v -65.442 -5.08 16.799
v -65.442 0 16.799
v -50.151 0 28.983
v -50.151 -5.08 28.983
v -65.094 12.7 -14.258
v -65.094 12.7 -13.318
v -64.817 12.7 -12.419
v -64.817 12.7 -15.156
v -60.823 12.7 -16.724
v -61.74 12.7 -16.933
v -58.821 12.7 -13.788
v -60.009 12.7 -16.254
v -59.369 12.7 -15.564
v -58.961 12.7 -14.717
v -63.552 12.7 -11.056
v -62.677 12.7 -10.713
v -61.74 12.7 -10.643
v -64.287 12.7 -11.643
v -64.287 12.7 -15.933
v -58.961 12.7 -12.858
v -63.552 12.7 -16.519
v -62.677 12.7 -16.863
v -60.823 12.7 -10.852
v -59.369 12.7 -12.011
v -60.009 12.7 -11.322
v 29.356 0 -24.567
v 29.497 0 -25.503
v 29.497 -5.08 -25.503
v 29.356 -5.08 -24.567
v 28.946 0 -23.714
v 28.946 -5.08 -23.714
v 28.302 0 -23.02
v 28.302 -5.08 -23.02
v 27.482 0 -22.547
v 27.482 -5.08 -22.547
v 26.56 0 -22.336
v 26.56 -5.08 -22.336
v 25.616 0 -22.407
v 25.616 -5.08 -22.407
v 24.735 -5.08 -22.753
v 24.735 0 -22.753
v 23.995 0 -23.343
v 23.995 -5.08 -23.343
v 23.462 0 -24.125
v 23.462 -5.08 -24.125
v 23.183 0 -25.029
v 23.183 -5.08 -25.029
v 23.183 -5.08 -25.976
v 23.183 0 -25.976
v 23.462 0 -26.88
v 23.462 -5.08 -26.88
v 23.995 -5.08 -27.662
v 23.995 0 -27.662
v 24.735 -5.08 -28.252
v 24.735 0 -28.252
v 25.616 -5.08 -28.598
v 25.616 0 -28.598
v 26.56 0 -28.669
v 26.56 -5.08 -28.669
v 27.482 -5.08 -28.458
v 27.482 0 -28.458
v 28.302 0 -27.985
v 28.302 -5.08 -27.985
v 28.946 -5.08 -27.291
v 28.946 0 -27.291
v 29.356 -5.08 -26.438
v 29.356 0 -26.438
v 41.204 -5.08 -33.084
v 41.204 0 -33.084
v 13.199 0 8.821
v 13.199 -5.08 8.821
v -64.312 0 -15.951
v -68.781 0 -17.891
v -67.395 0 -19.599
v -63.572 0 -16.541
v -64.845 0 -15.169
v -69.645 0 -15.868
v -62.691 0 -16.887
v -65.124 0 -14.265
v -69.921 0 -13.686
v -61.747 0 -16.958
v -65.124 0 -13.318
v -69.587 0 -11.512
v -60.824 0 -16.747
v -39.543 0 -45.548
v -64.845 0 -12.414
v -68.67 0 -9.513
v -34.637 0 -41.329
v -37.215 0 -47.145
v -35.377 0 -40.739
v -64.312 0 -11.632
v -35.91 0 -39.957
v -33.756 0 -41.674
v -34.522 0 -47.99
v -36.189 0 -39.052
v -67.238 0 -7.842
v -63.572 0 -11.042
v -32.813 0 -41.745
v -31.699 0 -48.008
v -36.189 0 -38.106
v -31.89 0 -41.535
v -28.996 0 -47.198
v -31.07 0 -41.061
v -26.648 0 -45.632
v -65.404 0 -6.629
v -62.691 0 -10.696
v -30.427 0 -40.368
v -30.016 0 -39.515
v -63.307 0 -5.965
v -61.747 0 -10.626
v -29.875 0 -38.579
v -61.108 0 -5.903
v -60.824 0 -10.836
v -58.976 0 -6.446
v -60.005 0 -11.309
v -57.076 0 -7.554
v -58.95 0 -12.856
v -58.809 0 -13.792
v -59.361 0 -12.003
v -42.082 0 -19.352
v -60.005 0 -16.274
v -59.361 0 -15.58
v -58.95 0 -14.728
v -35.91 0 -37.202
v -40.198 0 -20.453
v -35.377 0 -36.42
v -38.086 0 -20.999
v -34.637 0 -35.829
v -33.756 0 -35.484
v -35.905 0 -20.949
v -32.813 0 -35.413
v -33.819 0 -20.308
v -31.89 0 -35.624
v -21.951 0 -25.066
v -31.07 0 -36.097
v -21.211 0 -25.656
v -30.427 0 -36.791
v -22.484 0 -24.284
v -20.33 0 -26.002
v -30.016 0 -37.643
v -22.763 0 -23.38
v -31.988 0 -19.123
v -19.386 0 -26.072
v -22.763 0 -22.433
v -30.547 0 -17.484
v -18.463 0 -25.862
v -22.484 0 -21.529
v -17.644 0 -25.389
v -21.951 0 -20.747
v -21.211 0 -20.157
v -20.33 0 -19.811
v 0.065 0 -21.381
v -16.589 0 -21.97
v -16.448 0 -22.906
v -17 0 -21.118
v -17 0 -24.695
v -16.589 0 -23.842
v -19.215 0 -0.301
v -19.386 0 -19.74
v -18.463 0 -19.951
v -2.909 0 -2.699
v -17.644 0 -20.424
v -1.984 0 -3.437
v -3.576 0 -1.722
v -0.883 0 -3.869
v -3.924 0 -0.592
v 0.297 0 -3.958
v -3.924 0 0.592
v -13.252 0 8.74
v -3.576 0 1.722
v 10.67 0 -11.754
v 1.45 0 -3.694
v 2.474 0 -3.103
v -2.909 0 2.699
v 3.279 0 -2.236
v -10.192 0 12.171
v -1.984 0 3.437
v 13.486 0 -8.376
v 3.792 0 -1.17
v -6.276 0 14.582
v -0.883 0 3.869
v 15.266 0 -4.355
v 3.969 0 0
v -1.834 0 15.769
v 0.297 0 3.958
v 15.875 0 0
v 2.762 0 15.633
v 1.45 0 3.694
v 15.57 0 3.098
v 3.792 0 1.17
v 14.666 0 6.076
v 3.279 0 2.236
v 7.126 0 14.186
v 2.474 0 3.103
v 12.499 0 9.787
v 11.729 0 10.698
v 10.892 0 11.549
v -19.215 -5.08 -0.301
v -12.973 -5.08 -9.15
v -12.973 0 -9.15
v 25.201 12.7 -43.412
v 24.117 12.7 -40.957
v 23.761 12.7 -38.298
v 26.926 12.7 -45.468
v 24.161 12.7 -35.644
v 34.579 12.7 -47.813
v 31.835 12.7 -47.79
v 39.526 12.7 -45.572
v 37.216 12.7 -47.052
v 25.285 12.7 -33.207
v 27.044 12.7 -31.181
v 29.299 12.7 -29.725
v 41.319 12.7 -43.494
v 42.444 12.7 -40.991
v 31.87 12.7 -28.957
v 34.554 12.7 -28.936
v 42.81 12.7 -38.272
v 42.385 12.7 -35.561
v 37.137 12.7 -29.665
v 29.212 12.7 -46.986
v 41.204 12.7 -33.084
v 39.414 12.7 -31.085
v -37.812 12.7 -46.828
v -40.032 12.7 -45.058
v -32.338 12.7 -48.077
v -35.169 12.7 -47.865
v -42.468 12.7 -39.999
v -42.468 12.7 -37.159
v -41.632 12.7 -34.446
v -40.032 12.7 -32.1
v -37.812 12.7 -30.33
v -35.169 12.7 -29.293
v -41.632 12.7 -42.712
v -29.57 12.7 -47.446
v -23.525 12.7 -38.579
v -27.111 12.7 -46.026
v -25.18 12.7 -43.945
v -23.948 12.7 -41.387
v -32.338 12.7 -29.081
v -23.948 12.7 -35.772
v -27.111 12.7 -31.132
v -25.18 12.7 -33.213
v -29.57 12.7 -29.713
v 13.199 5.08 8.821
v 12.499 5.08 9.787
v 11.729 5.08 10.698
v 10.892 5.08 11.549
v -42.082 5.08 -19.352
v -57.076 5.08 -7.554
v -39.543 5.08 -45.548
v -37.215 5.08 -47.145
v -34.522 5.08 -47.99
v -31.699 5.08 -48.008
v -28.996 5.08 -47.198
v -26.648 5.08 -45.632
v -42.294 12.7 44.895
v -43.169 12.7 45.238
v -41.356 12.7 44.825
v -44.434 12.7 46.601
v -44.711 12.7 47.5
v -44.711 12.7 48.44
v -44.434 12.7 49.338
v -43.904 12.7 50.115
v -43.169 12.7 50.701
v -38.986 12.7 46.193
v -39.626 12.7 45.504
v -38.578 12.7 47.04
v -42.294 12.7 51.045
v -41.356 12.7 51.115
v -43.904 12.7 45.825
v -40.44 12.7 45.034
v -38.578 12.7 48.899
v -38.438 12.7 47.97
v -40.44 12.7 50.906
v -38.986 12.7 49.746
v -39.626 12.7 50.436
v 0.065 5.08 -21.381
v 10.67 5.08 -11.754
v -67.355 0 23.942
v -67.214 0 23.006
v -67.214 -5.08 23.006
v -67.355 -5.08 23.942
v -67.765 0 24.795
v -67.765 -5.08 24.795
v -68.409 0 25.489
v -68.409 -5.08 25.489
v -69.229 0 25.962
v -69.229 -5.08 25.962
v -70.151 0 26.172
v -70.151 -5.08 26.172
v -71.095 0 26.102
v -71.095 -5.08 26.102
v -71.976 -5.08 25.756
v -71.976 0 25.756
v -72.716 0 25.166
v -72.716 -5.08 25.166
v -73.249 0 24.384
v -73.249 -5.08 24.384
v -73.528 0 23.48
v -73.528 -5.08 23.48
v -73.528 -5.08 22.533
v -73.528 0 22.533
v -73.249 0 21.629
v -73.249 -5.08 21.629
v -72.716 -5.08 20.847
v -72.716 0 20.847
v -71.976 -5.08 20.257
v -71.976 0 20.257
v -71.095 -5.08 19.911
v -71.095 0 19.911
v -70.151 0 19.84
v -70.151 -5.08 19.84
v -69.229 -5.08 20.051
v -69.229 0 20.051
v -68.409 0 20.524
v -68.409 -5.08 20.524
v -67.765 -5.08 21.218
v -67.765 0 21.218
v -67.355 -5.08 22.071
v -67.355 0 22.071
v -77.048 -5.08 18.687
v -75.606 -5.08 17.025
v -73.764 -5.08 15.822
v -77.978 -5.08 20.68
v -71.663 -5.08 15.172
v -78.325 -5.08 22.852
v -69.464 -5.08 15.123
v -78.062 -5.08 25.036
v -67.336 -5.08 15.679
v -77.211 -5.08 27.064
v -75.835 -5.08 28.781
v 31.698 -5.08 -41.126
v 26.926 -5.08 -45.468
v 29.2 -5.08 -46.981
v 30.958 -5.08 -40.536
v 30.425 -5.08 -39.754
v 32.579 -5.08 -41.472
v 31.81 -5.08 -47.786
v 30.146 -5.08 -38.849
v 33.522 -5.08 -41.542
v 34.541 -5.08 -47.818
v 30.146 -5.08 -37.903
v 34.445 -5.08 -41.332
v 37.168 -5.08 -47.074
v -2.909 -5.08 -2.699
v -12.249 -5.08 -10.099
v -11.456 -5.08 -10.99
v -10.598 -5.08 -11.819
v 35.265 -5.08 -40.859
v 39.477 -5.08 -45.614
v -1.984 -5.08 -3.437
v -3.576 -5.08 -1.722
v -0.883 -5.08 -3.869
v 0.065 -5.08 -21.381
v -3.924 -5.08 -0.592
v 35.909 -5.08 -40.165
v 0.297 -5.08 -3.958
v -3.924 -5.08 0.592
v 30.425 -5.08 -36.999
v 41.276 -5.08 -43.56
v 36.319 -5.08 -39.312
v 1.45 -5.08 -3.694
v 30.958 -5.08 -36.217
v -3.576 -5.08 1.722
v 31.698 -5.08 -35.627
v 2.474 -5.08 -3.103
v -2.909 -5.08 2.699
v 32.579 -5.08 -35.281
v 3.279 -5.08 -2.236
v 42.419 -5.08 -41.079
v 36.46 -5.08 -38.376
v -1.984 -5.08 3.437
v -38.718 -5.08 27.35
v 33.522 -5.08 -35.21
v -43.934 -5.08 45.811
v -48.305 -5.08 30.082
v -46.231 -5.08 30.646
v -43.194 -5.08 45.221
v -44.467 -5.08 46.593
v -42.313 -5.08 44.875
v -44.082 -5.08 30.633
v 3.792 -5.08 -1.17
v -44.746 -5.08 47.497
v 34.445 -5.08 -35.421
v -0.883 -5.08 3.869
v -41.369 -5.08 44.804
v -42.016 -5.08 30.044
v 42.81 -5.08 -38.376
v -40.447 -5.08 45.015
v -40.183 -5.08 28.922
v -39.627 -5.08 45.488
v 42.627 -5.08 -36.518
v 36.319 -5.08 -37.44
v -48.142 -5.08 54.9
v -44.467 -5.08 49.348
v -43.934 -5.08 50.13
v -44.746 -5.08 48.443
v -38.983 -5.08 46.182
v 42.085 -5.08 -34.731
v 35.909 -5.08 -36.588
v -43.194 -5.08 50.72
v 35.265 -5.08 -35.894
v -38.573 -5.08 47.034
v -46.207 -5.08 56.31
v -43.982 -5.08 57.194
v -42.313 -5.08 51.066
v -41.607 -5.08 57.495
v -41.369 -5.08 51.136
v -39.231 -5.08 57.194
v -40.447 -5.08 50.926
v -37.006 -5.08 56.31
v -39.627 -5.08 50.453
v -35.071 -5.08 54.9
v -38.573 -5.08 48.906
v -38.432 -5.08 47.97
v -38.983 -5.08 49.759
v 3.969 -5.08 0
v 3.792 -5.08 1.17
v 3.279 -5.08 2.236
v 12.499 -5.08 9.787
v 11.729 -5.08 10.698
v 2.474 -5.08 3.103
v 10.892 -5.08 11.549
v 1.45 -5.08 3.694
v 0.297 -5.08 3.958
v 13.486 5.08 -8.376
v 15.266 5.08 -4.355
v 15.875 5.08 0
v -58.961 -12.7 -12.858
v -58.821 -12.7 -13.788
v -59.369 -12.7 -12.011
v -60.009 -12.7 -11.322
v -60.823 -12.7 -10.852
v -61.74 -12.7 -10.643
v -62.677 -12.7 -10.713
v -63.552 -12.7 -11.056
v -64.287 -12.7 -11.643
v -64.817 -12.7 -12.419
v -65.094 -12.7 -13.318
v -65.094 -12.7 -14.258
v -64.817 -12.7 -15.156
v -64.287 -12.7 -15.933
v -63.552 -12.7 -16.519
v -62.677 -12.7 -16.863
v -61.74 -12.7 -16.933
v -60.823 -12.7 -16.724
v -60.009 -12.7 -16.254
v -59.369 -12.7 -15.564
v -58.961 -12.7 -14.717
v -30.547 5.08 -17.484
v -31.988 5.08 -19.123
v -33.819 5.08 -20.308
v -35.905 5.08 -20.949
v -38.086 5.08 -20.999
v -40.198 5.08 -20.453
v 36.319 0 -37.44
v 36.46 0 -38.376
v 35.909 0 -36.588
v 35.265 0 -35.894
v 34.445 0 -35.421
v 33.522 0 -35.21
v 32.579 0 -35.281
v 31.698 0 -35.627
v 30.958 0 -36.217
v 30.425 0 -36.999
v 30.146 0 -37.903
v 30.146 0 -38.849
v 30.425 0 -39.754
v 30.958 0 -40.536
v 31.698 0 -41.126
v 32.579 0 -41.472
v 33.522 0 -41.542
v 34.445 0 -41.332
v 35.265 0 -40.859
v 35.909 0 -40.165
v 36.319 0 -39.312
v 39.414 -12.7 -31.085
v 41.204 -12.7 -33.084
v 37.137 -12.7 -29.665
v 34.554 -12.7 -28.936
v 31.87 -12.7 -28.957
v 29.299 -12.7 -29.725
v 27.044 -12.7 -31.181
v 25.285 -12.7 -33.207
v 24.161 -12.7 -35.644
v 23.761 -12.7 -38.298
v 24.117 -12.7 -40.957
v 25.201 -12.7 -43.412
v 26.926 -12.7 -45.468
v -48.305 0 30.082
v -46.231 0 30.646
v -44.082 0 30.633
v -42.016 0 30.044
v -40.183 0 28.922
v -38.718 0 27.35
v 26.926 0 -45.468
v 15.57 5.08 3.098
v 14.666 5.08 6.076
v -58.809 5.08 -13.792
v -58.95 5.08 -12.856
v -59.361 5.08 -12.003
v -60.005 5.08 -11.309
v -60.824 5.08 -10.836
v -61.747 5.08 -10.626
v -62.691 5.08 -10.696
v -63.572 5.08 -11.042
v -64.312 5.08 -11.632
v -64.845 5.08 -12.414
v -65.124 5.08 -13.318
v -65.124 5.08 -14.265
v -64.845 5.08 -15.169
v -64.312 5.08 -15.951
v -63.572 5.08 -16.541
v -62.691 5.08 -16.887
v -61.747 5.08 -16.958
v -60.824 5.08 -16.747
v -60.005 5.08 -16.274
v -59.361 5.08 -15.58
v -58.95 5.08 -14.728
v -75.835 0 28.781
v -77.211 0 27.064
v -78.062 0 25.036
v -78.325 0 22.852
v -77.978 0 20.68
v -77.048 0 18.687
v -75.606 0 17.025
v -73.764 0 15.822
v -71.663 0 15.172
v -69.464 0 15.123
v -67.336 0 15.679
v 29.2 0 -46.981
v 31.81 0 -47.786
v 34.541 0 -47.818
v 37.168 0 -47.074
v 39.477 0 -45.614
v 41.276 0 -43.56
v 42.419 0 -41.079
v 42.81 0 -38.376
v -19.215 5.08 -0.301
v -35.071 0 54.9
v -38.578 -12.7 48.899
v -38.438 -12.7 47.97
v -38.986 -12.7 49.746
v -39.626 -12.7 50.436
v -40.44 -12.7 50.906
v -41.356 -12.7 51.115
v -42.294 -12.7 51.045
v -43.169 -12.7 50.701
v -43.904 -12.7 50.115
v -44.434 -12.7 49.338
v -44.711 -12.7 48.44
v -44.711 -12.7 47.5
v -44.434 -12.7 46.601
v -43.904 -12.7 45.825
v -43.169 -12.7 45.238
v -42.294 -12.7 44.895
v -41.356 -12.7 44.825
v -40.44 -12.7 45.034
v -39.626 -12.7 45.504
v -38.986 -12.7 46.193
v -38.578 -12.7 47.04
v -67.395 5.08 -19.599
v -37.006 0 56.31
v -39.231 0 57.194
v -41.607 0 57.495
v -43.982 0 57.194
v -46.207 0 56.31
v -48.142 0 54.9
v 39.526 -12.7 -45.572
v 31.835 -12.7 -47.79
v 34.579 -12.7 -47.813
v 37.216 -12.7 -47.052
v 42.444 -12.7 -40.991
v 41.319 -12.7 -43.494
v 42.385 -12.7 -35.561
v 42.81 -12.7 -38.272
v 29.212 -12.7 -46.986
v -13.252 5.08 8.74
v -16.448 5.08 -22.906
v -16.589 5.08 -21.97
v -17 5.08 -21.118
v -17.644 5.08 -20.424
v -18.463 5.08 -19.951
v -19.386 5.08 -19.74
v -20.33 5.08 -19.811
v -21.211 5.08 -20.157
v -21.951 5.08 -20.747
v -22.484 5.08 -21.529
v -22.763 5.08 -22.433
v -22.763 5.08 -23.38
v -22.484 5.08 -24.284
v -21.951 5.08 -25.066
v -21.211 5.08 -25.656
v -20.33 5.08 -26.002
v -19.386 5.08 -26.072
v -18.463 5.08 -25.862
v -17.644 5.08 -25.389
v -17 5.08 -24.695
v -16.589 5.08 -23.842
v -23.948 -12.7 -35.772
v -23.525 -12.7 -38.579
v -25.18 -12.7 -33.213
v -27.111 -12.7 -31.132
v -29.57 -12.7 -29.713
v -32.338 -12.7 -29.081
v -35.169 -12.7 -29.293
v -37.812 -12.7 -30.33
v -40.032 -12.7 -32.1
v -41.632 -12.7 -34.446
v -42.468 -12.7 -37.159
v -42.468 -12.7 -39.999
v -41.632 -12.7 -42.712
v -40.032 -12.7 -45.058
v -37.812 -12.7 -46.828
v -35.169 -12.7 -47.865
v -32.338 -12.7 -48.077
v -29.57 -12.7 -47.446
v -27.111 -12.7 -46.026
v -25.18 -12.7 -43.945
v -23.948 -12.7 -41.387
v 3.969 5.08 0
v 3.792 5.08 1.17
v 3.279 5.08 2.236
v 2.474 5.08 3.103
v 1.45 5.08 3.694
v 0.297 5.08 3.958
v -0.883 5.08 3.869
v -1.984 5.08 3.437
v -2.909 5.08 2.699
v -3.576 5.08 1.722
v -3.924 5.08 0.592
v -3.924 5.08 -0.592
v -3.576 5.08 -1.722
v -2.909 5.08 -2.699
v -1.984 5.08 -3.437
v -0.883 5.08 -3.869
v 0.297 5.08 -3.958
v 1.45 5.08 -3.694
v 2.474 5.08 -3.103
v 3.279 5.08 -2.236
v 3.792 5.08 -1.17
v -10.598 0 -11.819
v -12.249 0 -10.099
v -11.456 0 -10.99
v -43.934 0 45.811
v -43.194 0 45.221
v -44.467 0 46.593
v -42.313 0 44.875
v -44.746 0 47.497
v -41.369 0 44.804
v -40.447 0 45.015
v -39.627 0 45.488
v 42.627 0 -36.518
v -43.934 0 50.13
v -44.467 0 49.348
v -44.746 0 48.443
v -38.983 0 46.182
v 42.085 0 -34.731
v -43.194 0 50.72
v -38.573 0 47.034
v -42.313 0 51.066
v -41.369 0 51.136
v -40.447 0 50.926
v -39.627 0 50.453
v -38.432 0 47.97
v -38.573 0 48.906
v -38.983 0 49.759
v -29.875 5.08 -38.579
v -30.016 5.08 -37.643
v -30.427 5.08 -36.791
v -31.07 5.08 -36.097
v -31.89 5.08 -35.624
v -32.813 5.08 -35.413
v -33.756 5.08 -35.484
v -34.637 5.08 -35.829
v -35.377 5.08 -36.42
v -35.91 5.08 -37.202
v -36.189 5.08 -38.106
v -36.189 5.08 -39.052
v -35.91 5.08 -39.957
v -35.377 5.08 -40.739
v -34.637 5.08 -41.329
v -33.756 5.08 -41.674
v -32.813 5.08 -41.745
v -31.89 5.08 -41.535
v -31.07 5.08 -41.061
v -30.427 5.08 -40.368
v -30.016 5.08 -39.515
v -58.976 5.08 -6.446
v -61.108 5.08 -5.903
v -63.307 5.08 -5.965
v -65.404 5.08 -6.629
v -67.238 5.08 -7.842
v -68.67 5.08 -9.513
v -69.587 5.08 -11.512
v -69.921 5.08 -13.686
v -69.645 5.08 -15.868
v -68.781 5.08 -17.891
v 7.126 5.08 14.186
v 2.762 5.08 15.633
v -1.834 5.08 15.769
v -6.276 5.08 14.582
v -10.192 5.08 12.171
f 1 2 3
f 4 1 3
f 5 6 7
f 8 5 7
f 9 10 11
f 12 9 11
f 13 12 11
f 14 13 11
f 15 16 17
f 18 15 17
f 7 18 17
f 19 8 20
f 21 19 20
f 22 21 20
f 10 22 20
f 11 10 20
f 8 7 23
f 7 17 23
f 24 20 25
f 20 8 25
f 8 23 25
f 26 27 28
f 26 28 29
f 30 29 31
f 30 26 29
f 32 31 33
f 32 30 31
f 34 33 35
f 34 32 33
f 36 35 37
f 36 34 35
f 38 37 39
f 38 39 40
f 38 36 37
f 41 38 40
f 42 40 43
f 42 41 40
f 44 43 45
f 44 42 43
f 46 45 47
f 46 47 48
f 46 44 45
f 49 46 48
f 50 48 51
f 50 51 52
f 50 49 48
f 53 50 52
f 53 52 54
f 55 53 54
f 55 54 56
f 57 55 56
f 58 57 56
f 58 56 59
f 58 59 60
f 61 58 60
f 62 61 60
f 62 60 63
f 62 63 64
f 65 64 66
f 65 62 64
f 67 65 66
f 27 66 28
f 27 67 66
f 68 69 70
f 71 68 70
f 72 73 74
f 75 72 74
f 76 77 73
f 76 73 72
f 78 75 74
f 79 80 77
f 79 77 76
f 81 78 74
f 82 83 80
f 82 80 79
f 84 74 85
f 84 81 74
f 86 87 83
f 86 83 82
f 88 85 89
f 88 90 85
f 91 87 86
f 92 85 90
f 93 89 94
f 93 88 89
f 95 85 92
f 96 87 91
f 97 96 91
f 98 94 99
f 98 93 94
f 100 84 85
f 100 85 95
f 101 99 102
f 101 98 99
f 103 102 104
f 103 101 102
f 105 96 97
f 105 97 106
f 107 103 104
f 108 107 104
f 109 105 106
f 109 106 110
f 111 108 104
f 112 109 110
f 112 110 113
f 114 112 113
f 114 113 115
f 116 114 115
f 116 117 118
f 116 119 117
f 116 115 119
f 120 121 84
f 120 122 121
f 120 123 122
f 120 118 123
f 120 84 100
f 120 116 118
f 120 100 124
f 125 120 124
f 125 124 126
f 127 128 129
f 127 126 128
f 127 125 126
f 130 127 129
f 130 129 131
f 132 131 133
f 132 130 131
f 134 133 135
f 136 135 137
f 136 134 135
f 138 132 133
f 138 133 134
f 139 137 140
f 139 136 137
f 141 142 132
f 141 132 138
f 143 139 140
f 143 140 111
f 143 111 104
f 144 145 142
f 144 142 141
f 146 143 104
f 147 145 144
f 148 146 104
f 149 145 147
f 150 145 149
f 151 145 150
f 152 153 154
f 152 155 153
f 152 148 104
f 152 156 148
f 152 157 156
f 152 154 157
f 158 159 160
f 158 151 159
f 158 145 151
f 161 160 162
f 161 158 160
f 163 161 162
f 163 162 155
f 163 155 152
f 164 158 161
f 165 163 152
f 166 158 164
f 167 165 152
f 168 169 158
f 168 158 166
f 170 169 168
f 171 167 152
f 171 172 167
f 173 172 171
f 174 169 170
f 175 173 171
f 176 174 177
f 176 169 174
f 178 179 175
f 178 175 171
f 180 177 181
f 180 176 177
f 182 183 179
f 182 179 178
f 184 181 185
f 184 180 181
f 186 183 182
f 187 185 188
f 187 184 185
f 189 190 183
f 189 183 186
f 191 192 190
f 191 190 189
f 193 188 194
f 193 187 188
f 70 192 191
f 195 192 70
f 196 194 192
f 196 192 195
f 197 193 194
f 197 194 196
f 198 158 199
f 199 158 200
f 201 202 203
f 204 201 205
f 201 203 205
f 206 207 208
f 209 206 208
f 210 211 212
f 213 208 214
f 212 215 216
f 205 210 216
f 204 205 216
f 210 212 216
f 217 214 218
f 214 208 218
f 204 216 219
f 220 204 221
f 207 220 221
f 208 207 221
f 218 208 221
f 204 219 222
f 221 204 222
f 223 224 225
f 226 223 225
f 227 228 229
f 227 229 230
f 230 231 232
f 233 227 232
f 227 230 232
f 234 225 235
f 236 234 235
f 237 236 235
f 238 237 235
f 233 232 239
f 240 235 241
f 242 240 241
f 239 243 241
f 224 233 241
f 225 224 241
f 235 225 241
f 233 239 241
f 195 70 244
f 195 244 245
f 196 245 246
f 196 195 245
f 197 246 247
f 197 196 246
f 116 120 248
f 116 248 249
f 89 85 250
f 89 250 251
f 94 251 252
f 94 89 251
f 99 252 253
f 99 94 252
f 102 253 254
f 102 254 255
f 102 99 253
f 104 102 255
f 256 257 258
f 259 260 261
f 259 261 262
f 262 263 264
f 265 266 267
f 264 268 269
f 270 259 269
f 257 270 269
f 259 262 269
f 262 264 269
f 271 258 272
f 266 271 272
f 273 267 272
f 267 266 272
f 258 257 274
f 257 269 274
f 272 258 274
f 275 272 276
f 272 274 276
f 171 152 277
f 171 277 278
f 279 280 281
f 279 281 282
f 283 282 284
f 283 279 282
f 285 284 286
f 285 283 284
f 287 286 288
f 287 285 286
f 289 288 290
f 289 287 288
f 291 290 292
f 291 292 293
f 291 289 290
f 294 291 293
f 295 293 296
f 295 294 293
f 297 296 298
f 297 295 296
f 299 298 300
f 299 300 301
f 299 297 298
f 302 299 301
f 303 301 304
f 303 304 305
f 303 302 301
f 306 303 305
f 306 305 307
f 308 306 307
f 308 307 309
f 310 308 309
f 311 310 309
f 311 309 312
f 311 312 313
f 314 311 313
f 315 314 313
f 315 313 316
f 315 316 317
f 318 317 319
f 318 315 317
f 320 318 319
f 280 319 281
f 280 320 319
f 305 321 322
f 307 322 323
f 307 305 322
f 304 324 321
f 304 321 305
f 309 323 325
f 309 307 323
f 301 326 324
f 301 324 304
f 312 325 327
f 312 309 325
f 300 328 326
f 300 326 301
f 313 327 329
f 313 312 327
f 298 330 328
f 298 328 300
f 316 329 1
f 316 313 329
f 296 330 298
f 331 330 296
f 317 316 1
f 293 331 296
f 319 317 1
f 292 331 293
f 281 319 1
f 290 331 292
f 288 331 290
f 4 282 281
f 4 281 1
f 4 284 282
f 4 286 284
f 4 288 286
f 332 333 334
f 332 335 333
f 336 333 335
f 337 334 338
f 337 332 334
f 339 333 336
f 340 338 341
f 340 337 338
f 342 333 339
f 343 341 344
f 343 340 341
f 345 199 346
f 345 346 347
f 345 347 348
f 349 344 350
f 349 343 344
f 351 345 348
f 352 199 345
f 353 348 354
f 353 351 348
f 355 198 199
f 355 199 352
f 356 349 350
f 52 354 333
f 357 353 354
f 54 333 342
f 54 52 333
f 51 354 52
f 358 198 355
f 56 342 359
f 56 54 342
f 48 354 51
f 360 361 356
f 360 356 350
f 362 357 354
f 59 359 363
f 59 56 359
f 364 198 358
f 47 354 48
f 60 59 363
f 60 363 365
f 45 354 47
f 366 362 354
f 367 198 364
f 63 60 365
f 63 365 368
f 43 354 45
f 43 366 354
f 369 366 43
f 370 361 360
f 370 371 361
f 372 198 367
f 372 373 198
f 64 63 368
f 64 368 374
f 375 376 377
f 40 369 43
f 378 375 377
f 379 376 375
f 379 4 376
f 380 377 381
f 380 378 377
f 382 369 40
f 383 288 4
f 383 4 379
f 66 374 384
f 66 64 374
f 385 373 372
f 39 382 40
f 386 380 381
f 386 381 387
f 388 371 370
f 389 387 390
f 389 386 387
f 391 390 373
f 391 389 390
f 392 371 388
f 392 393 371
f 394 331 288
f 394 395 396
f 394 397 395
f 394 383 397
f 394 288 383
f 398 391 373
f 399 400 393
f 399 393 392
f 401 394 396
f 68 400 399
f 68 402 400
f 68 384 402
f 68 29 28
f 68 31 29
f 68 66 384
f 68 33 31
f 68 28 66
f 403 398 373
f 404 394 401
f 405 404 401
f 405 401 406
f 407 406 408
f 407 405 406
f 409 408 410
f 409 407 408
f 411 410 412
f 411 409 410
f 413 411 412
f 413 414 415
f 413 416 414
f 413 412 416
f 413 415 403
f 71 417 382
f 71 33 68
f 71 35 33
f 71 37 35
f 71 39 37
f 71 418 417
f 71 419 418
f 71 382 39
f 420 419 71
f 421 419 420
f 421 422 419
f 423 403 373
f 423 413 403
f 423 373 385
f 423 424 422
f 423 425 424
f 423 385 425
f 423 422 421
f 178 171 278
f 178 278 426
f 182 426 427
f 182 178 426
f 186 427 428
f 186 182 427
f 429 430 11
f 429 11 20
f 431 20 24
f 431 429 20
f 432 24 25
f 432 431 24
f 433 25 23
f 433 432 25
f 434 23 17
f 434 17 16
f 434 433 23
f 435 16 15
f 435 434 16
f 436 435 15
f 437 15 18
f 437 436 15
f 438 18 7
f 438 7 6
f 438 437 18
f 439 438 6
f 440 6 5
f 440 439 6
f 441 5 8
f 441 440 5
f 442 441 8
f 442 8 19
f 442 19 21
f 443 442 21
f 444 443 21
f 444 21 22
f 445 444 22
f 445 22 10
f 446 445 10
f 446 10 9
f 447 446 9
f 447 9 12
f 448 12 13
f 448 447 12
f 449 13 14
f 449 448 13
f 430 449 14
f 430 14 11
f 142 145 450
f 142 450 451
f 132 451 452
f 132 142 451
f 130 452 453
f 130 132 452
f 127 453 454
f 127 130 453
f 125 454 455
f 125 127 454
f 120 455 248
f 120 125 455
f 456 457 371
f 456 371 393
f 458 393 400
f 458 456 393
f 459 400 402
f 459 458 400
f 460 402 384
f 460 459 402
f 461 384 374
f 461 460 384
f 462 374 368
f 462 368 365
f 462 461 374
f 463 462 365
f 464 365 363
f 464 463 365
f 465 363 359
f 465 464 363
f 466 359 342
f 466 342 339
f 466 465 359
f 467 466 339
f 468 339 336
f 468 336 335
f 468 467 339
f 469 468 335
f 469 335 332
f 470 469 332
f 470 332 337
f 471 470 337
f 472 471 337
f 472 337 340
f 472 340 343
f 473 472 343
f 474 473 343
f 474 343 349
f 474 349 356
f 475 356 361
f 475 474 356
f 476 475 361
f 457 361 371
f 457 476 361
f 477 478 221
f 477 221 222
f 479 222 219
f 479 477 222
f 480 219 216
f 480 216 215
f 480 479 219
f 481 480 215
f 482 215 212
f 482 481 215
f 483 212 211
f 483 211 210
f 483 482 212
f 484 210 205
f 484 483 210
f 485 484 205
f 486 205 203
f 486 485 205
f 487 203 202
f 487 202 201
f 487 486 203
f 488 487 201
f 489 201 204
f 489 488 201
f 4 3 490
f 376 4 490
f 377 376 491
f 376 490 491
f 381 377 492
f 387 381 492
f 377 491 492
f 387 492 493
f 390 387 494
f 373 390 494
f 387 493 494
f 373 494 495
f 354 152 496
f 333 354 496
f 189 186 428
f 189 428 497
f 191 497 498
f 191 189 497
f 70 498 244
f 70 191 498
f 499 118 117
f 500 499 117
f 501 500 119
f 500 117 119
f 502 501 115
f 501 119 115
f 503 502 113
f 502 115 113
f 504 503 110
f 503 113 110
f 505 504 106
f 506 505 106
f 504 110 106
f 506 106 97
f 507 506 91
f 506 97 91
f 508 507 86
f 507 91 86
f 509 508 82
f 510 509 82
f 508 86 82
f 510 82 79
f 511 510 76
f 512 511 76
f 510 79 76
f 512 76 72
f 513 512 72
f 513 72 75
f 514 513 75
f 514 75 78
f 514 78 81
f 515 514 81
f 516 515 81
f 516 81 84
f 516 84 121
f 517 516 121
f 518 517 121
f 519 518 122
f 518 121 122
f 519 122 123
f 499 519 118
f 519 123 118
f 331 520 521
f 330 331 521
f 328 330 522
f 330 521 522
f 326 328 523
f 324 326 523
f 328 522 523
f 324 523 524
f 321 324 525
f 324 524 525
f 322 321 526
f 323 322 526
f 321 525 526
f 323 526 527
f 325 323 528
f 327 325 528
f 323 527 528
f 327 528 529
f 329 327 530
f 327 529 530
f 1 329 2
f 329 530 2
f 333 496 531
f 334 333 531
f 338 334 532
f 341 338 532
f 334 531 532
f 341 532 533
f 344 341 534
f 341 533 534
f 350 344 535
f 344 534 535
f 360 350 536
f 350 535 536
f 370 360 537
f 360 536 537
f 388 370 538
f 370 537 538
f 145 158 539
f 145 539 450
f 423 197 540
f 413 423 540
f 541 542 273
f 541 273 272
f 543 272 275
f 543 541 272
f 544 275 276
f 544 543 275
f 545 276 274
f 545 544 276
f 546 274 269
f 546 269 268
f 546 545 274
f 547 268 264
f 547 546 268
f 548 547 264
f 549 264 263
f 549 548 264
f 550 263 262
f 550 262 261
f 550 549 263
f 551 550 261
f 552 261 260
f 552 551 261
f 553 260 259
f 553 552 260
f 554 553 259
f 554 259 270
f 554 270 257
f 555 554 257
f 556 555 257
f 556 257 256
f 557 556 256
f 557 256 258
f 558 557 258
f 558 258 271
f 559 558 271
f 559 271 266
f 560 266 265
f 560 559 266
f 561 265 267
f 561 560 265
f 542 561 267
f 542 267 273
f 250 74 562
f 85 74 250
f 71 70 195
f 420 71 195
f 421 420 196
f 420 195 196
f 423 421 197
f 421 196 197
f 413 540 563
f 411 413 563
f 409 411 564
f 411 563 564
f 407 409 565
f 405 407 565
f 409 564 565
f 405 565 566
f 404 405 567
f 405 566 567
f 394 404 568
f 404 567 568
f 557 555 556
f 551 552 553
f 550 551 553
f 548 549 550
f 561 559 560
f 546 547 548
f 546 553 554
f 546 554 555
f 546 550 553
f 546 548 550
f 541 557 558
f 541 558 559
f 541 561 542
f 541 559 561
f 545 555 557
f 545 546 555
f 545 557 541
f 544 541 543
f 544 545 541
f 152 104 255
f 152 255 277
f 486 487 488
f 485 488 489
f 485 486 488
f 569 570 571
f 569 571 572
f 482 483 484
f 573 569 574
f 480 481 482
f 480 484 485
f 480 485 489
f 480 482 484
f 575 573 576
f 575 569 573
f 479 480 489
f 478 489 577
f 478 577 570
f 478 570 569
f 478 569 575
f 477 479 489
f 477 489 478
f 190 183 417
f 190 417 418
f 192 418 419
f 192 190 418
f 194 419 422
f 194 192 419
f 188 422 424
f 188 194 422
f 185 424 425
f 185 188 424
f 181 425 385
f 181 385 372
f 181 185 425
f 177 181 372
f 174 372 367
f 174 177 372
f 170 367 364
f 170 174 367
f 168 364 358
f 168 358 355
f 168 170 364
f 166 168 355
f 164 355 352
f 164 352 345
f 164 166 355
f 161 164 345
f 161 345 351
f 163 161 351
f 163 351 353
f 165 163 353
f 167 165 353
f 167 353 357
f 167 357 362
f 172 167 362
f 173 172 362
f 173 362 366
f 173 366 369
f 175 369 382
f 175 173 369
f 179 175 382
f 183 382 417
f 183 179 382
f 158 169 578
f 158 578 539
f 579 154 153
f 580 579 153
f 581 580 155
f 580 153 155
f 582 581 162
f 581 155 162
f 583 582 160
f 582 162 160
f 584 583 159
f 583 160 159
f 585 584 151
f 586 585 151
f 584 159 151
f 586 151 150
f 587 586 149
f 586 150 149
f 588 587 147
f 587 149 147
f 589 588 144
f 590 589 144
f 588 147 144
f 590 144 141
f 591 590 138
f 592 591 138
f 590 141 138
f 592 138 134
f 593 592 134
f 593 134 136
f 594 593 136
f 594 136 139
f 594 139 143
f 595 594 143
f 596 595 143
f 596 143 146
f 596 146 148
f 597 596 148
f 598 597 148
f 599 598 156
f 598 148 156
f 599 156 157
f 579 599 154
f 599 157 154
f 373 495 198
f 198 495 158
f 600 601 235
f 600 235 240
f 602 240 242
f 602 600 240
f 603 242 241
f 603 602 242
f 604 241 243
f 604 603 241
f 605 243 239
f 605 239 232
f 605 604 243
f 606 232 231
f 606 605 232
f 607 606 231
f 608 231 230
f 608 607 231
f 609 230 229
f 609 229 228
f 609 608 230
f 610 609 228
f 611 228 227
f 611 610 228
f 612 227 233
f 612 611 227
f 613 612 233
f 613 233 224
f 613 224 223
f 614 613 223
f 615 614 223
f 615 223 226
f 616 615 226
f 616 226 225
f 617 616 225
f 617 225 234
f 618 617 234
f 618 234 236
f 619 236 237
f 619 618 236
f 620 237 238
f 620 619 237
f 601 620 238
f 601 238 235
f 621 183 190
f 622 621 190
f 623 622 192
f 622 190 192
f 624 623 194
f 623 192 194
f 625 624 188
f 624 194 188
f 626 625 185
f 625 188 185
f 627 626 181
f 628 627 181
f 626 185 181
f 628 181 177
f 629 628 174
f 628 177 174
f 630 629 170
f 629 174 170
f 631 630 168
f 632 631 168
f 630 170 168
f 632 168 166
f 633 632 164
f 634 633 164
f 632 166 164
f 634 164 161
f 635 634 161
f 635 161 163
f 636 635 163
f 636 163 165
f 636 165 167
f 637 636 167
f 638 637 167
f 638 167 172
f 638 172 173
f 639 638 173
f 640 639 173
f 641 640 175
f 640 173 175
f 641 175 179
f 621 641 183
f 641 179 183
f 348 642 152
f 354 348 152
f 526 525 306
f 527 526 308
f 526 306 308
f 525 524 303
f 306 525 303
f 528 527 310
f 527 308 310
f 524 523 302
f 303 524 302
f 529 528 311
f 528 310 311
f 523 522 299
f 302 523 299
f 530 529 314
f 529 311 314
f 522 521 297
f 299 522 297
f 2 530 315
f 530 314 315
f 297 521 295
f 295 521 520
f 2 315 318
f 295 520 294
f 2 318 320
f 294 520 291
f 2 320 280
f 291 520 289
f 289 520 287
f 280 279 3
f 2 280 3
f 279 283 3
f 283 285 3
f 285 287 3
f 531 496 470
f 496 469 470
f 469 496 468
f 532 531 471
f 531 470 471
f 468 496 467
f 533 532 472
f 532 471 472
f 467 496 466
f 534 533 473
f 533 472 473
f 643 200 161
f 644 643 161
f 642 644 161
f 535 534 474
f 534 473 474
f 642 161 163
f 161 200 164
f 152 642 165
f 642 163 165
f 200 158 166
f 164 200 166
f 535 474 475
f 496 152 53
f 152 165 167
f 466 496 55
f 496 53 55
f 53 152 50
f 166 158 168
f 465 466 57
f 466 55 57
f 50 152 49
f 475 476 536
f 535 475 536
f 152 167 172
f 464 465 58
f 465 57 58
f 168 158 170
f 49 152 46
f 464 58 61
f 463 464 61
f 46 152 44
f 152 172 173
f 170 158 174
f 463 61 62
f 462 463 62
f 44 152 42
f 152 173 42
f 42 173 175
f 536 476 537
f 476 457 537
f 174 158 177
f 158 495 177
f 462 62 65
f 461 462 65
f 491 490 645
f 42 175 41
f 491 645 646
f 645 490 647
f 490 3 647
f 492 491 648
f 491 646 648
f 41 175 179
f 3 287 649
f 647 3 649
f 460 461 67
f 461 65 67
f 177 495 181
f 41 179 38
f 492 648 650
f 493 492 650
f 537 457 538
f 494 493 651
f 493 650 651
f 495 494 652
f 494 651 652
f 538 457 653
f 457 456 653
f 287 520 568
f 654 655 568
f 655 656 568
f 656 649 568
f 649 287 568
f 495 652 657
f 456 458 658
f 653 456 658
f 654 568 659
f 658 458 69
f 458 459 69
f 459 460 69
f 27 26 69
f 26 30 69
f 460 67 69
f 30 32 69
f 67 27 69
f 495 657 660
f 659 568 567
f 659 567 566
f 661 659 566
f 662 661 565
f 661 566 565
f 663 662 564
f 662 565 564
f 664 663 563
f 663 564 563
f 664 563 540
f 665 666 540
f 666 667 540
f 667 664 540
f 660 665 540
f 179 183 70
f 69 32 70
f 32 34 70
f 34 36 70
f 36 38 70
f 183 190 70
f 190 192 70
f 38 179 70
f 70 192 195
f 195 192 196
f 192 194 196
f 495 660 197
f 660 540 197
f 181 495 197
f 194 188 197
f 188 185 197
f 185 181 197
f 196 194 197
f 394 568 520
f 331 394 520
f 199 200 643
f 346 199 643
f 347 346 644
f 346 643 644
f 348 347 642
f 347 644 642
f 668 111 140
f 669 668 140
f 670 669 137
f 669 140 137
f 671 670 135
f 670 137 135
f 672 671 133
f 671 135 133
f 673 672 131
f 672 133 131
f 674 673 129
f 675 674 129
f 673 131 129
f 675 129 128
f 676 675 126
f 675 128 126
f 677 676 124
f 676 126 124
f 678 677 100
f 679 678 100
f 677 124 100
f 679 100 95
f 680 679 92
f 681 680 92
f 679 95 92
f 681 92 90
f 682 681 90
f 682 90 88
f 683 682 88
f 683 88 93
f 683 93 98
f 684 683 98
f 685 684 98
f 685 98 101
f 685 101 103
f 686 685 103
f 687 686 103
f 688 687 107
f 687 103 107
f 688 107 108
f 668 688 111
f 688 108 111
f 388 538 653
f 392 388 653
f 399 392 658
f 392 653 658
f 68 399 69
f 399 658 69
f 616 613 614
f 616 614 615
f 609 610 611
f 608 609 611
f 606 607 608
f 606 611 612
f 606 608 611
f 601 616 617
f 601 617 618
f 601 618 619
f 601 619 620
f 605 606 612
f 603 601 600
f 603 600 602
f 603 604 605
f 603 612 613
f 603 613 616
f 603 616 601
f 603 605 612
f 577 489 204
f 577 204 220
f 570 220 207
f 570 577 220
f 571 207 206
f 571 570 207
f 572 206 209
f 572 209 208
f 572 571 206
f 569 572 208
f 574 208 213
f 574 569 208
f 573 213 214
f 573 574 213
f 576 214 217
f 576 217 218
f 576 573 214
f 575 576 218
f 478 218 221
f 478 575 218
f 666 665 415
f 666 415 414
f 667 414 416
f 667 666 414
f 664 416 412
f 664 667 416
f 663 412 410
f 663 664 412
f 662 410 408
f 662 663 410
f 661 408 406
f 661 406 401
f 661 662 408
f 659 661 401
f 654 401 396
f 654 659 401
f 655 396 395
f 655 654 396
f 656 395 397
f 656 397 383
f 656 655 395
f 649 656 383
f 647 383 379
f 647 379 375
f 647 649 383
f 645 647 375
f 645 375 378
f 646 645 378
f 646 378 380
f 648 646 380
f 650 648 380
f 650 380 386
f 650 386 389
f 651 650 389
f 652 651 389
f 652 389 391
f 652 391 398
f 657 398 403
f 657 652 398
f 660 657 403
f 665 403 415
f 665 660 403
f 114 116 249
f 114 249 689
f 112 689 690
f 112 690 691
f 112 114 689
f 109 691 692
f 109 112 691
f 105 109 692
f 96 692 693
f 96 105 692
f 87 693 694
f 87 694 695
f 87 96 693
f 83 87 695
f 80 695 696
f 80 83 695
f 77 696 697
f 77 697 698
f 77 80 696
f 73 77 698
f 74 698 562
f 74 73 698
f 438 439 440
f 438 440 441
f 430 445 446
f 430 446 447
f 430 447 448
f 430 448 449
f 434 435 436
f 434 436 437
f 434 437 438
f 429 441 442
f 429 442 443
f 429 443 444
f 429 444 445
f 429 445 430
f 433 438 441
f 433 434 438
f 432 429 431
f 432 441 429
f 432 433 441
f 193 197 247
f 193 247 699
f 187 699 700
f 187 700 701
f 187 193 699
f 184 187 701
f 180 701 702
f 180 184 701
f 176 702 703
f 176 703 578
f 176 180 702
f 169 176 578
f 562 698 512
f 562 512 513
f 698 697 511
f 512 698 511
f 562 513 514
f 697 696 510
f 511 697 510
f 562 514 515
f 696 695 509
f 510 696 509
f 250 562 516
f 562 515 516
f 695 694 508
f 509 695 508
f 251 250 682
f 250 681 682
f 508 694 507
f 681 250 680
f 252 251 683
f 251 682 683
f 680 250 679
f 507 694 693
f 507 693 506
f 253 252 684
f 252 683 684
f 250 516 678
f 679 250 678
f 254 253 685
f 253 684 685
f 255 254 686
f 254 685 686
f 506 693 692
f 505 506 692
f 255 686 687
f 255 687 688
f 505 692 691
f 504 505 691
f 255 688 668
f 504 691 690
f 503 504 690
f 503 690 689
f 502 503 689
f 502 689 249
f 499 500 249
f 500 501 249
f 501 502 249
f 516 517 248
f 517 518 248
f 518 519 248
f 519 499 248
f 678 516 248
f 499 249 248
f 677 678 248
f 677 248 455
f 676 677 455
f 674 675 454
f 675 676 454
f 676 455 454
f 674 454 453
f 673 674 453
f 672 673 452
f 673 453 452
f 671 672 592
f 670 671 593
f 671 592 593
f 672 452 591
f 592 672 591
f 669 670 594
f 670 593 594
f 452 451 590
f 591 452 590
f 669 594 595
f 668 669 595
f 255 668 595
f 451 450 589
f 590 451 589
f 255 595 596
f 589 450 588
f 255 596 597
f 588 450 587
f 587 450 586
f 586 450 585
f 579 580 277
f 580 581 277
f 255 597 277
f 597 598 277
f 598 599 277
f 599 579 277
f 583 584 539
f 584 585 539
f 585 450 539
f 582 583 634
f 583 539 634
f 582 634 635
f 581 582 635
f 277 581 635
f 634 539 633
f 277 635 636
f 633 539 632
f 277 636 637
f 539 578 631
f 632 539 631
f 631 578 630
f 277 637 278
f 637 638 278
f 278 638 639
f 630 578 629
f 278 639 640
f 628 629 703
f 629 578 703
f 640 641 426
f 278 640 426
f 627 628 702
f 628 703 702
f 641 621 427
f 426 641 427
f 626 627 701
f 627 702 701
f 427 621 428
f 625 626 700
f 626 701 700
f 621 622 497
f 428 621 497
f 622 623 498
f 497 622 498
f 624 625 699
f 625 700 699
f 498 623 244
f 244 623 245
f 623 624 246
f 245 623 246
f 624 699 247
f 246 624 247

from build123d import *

# Parameters (mm, degrees)
F0_R     = 3.175
F0_R_2   = 3.96875
F2_DEPTH = 5.08
F3_DEPTH = 5.08
F6_DEPTH = 25.4
F4_R     = 3.1539027902
F5_R     = 9.525
F5_R_2   = 3.1539027902


with BuildPart() as f2:
    # F0 (on Front) → F2 (new body)
    with BuildSketch(Plane.XZ):
        with BuildLine():
            ThreePointArc((-13.2524193062, 8.7400805221), (-1.834314477, 15.7686687897), (10.8922900307, 11.5487507067))
            Line((10.8922900307, 11.5487507067), (-35.0711574392, 54.8995176744))
            ThreePointArc((-35.0711574392, 54.8995176744), (-32.8608164346, 51.7436071154), (-32.0815314576, 47.9702672503))
            ThreePointArc((-32.0815314576, 47.9702672503), (-45.3798713227, 39.2245522274), (-48.1419054761, 54.8995176744))
            Line((-48.1419054761, 54.8995176744), (-75.8348368232, 28.7807237291))
            ThreePointArc((-75.8348368232, 28.7807237291), (-67.2442419203, 30.2944442282), (-62.4511918078, 23.0063483758))
            ThreePointArc((-62.4511918078, 23.0063483758), (-63.237943921, 19.5609585706), (-65.4422370763, 16.798571653))
            Line((-65.4422370763, 16.798571653), (-50.1509863937, 28.9828821829))
            ThreePointArc((-50.1509863937, 28.9828821829), (-44.0823996147, 30.6328866939), (-38.7182233604, 27.3502241323))
            Line((-38.7182233604, 27.3502241323), (-19.2147683858, -0.3005169703))
            Line((-19.2147683858, -0.3005169703), (-13.2524193062, 8.7400805221))
        make_face()
        with BuildLine():
            ThreePointArc((-32.0815314576, 47.9702672503), (-32.8608164346, 51.7436071154), (-35.0711574392, 54.8995176744))
            ThreePointArc((-35.0711574392, 54.8995176744), (-41.6065314576, 57.4952672503), (-48.1419054761, 54.8995176744))
            ThreePointArc((-48.1419054761, 54.8995176744), (-45.3798713227, 39.2245522274), (-32.0815314576, 47.9702672503))
        make_face()
        with Locations((-41.6065314576, 47.9702672503)):
            Circle(F0_R, mode=Mode.SUBTRACT)
        with BuildLine():
            ThreePointArc((-62.4511918078, 23.0063483758), (-67.2442419203, 30.2944442282), (-75.8348368232, 28.7807237291))
            ThreePointArc((-75.8348368232, 28.7807237291), (-76.3849752141, 17.8055319436), (-65.4422370763, 16.798571653))
            ThreePointArc((-65.4422370763, 16.798571653), (-63.237943921, 19.5609585706), (-62.4511918078, 23.0063483758))
        make_face()
        with Locations((-70.3886918078, 23.0063483758)):
            Circle(F0_R, mode=Mode.SUBTRACT)
        with BuildLine():
            ThreePointArc((15.875, 0), (15.1912005478, 4.609018433), (13.1987101208, 8.820979319))
            ThreePointArc((13.1987101208, 8.820979319), (12.1224690662, 10.2499448164), (10.8922900307, 11.5487507067))
            ThreePointArc((10.8922900307, 11.5487507067), (-1.834314477, 15.7686687897), (-13.2524193062, 8.7400805221))
            ThreePointArc((-13.2524193062, 8.7400805221), (-15.8730587934, -0.2482529814), (-12.9726166036, -9.1502373442))
            ThreePointArc((-12.9726166036, -9.1502373442), (-11.8607666217, -10.5516747555), (-10.5983019047, -11.8191210221))
            ThreePointArc((-10.5983019047, -11.8191210221), (0.0485522706, -15.8749257534), (10.6703987497, -11.7540722953))
            ThreePointArc((10.6703987497, -11.7540722953), (14.5156502636, -6.4274040191), (15.875, 0))
        make_face()
        Circle(F0_R_2, mode=Mode.SUBTRACT)
        with BuildLine():
            Line((-10.5983019047, -11.8191210221), (0.0653932355, -21.3813431455))
            Line((0.0653932355, -21.3813431455), (10.6703987497, -11.7540722953))
            ThreePointArc((10.6703987497, -11.7540722953), (0.0485522706, -15.8749257534), (-10.5983019047, -11.8191210221))
        make_face()
        with BuildLine():
            ThreePointArc((-12.9726166036, -9.1502373442), (-15.8730587934, -0.2482529814), (-13.2524193062, 8.7400805221))
            Line((-13.2524193062, 8.7400805221), (-19.2147683858, -0.3005169703))
            Line((-19.2147683858, -0.3005169703), (-12.9726166036, -9.1502373442))
        make_face()
        with BuildLine():
            ThreePointArc((26.9262440233, -45.4676864135), (27.0442454474, -31.1806737127), (41.2044512386, -33.0836262089))
            Line((41.2044512386, -33.0836262089), (13.1987101208, 8.820979319))
            ThreePointArc((13.1987101208, 8.820979319), (15.1912005478, 4.609018433), (15.875, 0))
            ThreePointArc((15.875, 0), (14.5156502636, -6.4274040191), (10.6703987497, -11.7540722953))
            Line((10.6703987497, -11.7540722953), (0.0653932355, -21.3813431455))
            Line((0.0653932355, -21.3813431455), (26.9262440233, -45.4676864135))
        make_face()
        with Locations((26.3222689506, -25.5025770961)):
            Circle(F0_R, mode=Mode.SUBTRACT)
        with BuildLine():
            ThreePointArc((26.9262440233, -45.4676864135), (37.1682864336, -47.0737686401), (42.8102251661, -38.3762138003))
            ThreePointArc((42.8102251661, -38.3762138003), (42.3999454948, -35.6108027404), (41.2044512386, -33.0836262089))
            ThreePointArc((41.2044512386, -33.0836262089), (27.0442454474, -31.1806737127), (26.9262440233, -45.4676864135))
        make_face()
        with Locations((33.2852251661, -38.3762138003)):
            Circle(F0_R, mode=Mode.SUBTRACT)
    extrude(amount=F2_DEPTH)


with BuildPart() as f3:
    # F0 (on Front) → F3 (new body)
    with BuildSketch(Plane.XZ):
        with BuildLine():
            ThreePointArc((15.875, 0), (15.1912005478, 4.609018433), (13.1987101208, 8.820979319))
            ThreePointArc((13.1987101208, 8.820979319), (12.1224690662, 10.2499448164), (10.8922900307, 11.5487507067))
            ThreePointArc((10.8922900307, 11.5487507067), (-1.834314477, 15.7686687897), (-13.2524193062, 8.7400805221))
            ThreePointArc((-13.2524193062, 8.7400805221), (-15.8730587934, -0.2482529814), (-12.9726166036, -9.1502373442))
            ThreePointArc((-12.9726166036, -9.1502373442), (-11.8607666217, -10.5516747555), (-10.5983019047, -11.8191210221))
            ThreePointArc((-10.5983019047, -11.8191210221), (0.0485522706, -15.8749257534), (10.6703987497, -11.7540722953))
            ThreePointArc((10.6703987497, -11.7540722953), (14.5156502636, -6.4274040191), (15.875, 0))
        make_face()
        Circle(F0_R_2, mode=Mode.SUBTRACT)
        with BuildLine():
            ThreePointArc((-12.9726166036, -9.1502373442), (-15.8730587934, -0.2482529814), (-13.2524193062, 8.7400805221))
            Line((-13.2524193062, 8.7400805221), (-19.2147683858, -0.3005169703))
            Line((-19.2147683858, -0.3005169703), (-12.9726166036, -9.1502373442))
        make_face()
        with BuildLine():
            Line((-10.5983019047, -11.8191210221), (0.0653932355, -21.3813431455))
            Line((0.0653932355, -21.3813431455), (10.6703987497, -11.7540722953))
            ThreePointArc((10.6703987497, -11.7540722953), (0.0485522706, -15.8749257534), (-10.5983019047, -11.8191210221))
        make_face()
        with BuildLine():
            Line((-26.647623873, -45.6315380732), (0.0653932355, -21.3813431455))
            Line((0.0653932355, -21.3813431455), (-10.5983019047, -11.8191210221))
            ThreePointArc((-10.5983019047, -11.8191210221), (-11.8607666217, -10.5516747555), (-12.9726166036, -9.1502373442))
            Line((-12.9726166036, -9.1502373442), (-19.2147683858, -0.3005169703))
            Line((-19.2147683858, -0.3005169703), (-30.5474012326, -17.4839744853))
            ThreePointArc((-30.5474012326, -17.4839744853), (-35.9047663103, -20.9493627188), (-42.0820013957, -19.3518512525))
            Line((-42.0820013957, -19.3518512525), (-57.0757936348, -7.5537803256))
            ThreePointArc((-57.0757936348, -7.5537803256), (-54.8440071189, -10.3244537385), (-54.0466841448, -13.7916973539))
            ThreePointArc((-54.0466841448, -13.7916973539), (-58.817458973, -21.070142101), (-67.394906617, -19.5992776228))
            Line((-67.394906617, -19.5992776228), (-39.5427300894, -45.5481910186))
            ThreePointArc((-39.5427300894, -45.5481910186), (-36.849933329, -29.8449609995), (-23.5248631228, -38.579094696))
            ThreePointArc((-23.5248631228, -38.579094696), (-24.3404729646, -42.4355371074), (-26.647623873, -45.6315380732))
        make_face()
        with Locations((-19.6233562292, -22.9063374758)):
            Circle(F0_R, mode=Mode.SUBTRACT)
        with BuildLine():
            ThreePointArc((-57.0757936348, -7.5537803256), (-68.0121676911, -8.627656241), (-67.394906617, -19.5992776228))
            ThreePointArc((-67.394906617, -19.5992776228), (-58.817458973, -21.070142101), (-54.0466841448, -13.7916973539))
            ThreePointArc((-54.0466841448, -13.7916973539), (-54.8440071189, -10.3244537385), (-57.0757936348, -7.5537803256))
        make_face()
        with Locations((-61.9841841448, -13.7916973539)):
            Circle(F0_R, mode=Mode.SUBTRACT)
        with BuildLine():
            ThreePointArc((-39.5427300894, -45.5481910186), (-33.1114263313, -48.1038957423), (-26.647623873, -45.6315380732))
            ThreePointArc((-26.647623873, -45.6315380732), (-24.3404729646, -42.4355371074), (-23.5248631228, -38.579094696))
            ThreePointArc((-23.5248631228, -38.579094696), (-36.849933329, -29.8449609995), (-39.5427300894, -45.5481910186))
        make_face()
        with Locations((-33.0498631228, -38.579094696)):
            Circle(F0_R, mode=Mode.SUBTRACT)
    extrude(amount=-F3_DEPTH)


with BuildPart() as f6:
    # F4 (on offset) → F6 (new body)
    with BuildSketch(Plane.XZ.offset(12.7)):
        with BuildLine():
            ThreePointArc((41.2044512386, -33.0836262089), (27.0442454474, -31.1806737127), (26.9262440233, -45.4676864135))
            ThreePointArc((26.9262440233, -45.4676864135), (39.5262048847, -45.5717538878), (41.2044512386, -33.0836262089))
        make_face()
    extrude(amount=-F6_DEPTH)


with BuildPart() as f6b:
    # F4 (on offset) → F6, piece 2 (new body)
    with BuildSketch(Plane.XZ.offset(12.7)):
        with Locations((-41.5921546519, 47.9698292911)):
            Circle(F4_R)
    extrude(amount=-F6_DEPTH)


with BuildPart() as f6c:
    # F5 (on offset) → F6, piece 3 (new body)
    with BuildSketch(Plane.XZ.offset(12.7)):
        with Locations((-33.0498631228, -38.579094696)):
            Circle(F5_R)
    extrude(amount=-F6_DEPTH)


with BuildPart() as f6d:
    # F5 (on offset) → F6, piece 4 (new body)
    with BuildSketch(Plane.XZ.offset(12.7)):
        with Locations((-61.9752332568, -13.7877808884)):
            Circle(F5_R_2)
    extrude(amount=-F6_DEPTH)


solid = Compound([f2.part, f3.part, f6.part, f6b.part, f6c.part, f6d.part])
